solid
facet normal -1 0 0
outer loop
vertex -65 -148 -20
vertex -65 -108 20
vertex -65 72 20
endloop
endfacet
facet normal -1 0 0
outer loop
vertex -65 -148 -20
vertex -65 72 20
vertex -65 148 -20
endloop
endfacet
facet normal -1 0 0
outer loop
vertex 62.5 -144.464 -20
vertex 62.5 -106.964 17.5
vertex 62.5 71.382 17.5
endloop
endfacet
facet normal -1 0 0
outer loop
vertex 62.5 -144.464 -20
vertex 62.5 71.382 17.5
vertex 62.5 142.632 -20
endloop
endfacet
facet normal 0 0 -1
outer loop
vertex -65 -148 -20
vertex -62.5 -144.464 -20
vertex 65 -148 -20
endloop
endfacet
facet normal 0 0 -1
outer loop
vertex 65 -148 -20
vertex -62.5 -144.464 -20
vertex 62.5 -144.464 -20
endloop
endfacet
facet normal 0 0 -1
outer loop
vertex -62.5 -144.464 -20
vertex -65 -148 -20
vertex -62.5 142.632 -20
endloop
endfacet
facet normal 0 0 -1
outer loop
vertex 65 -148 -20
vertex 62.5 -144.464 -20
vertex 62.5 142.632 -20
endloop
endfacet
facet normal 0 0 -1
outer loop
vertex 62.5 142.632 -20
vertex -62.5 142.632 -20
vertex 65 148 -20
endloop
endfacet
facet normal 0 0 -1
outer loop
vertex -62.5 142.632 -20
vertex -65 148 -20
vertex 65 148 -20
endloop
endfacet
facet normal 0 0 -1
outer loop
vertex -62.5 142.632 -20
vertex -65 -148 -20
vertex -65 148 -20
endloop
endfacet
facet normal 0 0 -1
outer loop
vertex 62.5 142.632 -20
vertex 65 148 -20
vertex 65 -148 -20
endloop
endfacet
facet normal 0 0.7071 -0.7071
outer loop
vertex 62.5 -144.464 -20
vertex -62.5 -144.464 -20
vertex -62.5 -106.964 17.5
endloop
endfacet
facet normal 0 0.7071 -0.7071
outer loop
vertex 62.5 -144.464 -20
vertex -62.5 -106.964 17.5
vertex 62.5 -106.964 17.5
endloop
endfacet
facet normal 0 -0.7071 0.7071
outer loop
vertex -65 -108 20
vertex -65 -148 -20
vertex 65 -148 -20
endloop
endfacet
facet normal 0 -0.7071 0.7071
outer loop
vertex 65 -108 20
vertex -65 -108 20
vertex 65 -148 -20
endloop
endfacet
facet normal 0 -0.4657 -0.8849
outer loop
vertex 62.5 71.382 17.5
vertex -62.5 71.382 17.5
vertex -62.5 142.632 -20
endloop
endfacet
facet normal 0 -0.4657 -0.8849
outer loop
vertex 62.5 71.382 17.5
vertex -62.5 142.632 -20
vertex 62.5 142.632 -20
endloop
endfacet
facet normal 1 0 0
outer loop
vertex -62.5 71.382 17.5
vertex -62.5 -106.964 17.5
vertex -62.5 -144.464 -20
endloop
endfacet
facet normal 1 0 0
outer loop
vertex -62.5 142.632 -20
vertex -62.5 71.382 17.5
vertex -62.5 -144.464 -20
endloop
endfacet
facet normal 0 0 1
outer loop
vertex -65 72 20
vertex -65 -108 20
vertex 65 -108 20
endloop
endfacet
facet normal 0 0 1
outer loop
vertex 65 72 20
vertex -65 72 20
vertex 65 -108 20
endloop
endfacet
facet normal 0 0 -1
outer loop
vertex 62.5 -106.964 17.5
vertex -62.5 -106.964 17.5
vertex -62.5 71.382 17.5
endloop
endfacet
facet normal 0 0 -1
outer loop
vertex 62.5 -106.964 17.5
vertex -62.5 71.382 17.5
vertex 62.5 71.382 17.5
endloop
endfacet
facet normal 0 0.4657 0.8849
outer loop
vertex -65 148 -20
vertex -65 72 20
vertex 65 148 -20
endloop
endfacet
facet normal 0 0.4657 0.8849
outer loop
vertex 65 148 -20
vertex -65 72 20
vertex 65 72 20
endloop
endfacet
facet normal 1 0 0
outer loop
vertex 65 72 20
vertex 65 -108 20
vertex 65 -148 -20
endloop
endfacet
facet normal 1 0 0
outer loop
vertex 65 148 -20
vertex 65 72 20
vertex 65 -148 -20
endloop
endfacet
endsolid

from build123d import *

# Parameters (mm, degrees)
F0_W     = 130
F0_H     = 296
F1_DEPTH = 20
F2_SIZE2 = 75.99999
F2_SIZE  = 39.99999
F3_SIZE2 = 39.99999
F3_SIZE  = 39.99999
F4_T     = 2.5


# Not quite as in the source:
# - a fillet or chamfer is up to 0.001 mm smaller than in the source, because OpenCascade refuses the exact size
# - a shell that OpenCascade refuses in one call is made with other operations: the cavity is built on its own and cut out


with BuildPart() as f1:
    # F0 (on Top) → F1 (new body, symmetric)
    with BuildSketch(Plane.XY):
        Rectangle(F0_W, F0_H)
    extrude(amount=F1_DEPTH, both=True)

    # F2 (size 40 and 76 in the source; OpenCascade refuses exactly that, so slightly less here)
    f2_edges = [f1.edges().sort_by_distance(p)[0] for p in [
        (0, 148, 20),
    ]]
    f2_side = f1.faces().sort_by_distance((0, 148, 0))[0]
    chamfer(f2_edges, length=F2_SIZE, length2=F2_SIZE2, reference=f2_side)

    # F3 (size 40 and 40 in the source; OpenCascade refuses exactly that, so slightly less here)
    f3_edges = [f1.edges().sort_by_distance(p)[0] for p in [
        (0, -148, 20),
    ]]
    chamfer(f3_edges, length=F3_SIZE, length2=F3_SIZE2)

    # F4: shell of thickness 2.5, made by hand


with BuildPart() as f4_core1:
    # F4_t2: copy of F1
    add(f1.part)

    # the walls: a layer under each face that stays
    f4_faces = [f4_core1.faces().sort_by_distance(p)[0] for p in [
        (-65, 0, 0),
        (0, -18, 20),
        (0, -128.000005, 5e-06),
        (0, 110.000005, 5e-06),
        (0, -148, -19.999995),
        (0, 148, -19.999995),
        (65, 0, 0),
    ]]
    thicken(f4_faces, amount=-F4_T, mode=Mode.SUBTRACT)


with BuildPart() as f1_1:
    add(f1.part)

    # what is left inside the walls is the cavity
    f4_cavity = [f4_core1.part.solids().sort_by_distance(p)[0] for p in [
        (0, -48.765554, -19.975),
    ]]
    add(f4_cavity, mode=Mode.SUBTRACT)


solid = f1_1.part
